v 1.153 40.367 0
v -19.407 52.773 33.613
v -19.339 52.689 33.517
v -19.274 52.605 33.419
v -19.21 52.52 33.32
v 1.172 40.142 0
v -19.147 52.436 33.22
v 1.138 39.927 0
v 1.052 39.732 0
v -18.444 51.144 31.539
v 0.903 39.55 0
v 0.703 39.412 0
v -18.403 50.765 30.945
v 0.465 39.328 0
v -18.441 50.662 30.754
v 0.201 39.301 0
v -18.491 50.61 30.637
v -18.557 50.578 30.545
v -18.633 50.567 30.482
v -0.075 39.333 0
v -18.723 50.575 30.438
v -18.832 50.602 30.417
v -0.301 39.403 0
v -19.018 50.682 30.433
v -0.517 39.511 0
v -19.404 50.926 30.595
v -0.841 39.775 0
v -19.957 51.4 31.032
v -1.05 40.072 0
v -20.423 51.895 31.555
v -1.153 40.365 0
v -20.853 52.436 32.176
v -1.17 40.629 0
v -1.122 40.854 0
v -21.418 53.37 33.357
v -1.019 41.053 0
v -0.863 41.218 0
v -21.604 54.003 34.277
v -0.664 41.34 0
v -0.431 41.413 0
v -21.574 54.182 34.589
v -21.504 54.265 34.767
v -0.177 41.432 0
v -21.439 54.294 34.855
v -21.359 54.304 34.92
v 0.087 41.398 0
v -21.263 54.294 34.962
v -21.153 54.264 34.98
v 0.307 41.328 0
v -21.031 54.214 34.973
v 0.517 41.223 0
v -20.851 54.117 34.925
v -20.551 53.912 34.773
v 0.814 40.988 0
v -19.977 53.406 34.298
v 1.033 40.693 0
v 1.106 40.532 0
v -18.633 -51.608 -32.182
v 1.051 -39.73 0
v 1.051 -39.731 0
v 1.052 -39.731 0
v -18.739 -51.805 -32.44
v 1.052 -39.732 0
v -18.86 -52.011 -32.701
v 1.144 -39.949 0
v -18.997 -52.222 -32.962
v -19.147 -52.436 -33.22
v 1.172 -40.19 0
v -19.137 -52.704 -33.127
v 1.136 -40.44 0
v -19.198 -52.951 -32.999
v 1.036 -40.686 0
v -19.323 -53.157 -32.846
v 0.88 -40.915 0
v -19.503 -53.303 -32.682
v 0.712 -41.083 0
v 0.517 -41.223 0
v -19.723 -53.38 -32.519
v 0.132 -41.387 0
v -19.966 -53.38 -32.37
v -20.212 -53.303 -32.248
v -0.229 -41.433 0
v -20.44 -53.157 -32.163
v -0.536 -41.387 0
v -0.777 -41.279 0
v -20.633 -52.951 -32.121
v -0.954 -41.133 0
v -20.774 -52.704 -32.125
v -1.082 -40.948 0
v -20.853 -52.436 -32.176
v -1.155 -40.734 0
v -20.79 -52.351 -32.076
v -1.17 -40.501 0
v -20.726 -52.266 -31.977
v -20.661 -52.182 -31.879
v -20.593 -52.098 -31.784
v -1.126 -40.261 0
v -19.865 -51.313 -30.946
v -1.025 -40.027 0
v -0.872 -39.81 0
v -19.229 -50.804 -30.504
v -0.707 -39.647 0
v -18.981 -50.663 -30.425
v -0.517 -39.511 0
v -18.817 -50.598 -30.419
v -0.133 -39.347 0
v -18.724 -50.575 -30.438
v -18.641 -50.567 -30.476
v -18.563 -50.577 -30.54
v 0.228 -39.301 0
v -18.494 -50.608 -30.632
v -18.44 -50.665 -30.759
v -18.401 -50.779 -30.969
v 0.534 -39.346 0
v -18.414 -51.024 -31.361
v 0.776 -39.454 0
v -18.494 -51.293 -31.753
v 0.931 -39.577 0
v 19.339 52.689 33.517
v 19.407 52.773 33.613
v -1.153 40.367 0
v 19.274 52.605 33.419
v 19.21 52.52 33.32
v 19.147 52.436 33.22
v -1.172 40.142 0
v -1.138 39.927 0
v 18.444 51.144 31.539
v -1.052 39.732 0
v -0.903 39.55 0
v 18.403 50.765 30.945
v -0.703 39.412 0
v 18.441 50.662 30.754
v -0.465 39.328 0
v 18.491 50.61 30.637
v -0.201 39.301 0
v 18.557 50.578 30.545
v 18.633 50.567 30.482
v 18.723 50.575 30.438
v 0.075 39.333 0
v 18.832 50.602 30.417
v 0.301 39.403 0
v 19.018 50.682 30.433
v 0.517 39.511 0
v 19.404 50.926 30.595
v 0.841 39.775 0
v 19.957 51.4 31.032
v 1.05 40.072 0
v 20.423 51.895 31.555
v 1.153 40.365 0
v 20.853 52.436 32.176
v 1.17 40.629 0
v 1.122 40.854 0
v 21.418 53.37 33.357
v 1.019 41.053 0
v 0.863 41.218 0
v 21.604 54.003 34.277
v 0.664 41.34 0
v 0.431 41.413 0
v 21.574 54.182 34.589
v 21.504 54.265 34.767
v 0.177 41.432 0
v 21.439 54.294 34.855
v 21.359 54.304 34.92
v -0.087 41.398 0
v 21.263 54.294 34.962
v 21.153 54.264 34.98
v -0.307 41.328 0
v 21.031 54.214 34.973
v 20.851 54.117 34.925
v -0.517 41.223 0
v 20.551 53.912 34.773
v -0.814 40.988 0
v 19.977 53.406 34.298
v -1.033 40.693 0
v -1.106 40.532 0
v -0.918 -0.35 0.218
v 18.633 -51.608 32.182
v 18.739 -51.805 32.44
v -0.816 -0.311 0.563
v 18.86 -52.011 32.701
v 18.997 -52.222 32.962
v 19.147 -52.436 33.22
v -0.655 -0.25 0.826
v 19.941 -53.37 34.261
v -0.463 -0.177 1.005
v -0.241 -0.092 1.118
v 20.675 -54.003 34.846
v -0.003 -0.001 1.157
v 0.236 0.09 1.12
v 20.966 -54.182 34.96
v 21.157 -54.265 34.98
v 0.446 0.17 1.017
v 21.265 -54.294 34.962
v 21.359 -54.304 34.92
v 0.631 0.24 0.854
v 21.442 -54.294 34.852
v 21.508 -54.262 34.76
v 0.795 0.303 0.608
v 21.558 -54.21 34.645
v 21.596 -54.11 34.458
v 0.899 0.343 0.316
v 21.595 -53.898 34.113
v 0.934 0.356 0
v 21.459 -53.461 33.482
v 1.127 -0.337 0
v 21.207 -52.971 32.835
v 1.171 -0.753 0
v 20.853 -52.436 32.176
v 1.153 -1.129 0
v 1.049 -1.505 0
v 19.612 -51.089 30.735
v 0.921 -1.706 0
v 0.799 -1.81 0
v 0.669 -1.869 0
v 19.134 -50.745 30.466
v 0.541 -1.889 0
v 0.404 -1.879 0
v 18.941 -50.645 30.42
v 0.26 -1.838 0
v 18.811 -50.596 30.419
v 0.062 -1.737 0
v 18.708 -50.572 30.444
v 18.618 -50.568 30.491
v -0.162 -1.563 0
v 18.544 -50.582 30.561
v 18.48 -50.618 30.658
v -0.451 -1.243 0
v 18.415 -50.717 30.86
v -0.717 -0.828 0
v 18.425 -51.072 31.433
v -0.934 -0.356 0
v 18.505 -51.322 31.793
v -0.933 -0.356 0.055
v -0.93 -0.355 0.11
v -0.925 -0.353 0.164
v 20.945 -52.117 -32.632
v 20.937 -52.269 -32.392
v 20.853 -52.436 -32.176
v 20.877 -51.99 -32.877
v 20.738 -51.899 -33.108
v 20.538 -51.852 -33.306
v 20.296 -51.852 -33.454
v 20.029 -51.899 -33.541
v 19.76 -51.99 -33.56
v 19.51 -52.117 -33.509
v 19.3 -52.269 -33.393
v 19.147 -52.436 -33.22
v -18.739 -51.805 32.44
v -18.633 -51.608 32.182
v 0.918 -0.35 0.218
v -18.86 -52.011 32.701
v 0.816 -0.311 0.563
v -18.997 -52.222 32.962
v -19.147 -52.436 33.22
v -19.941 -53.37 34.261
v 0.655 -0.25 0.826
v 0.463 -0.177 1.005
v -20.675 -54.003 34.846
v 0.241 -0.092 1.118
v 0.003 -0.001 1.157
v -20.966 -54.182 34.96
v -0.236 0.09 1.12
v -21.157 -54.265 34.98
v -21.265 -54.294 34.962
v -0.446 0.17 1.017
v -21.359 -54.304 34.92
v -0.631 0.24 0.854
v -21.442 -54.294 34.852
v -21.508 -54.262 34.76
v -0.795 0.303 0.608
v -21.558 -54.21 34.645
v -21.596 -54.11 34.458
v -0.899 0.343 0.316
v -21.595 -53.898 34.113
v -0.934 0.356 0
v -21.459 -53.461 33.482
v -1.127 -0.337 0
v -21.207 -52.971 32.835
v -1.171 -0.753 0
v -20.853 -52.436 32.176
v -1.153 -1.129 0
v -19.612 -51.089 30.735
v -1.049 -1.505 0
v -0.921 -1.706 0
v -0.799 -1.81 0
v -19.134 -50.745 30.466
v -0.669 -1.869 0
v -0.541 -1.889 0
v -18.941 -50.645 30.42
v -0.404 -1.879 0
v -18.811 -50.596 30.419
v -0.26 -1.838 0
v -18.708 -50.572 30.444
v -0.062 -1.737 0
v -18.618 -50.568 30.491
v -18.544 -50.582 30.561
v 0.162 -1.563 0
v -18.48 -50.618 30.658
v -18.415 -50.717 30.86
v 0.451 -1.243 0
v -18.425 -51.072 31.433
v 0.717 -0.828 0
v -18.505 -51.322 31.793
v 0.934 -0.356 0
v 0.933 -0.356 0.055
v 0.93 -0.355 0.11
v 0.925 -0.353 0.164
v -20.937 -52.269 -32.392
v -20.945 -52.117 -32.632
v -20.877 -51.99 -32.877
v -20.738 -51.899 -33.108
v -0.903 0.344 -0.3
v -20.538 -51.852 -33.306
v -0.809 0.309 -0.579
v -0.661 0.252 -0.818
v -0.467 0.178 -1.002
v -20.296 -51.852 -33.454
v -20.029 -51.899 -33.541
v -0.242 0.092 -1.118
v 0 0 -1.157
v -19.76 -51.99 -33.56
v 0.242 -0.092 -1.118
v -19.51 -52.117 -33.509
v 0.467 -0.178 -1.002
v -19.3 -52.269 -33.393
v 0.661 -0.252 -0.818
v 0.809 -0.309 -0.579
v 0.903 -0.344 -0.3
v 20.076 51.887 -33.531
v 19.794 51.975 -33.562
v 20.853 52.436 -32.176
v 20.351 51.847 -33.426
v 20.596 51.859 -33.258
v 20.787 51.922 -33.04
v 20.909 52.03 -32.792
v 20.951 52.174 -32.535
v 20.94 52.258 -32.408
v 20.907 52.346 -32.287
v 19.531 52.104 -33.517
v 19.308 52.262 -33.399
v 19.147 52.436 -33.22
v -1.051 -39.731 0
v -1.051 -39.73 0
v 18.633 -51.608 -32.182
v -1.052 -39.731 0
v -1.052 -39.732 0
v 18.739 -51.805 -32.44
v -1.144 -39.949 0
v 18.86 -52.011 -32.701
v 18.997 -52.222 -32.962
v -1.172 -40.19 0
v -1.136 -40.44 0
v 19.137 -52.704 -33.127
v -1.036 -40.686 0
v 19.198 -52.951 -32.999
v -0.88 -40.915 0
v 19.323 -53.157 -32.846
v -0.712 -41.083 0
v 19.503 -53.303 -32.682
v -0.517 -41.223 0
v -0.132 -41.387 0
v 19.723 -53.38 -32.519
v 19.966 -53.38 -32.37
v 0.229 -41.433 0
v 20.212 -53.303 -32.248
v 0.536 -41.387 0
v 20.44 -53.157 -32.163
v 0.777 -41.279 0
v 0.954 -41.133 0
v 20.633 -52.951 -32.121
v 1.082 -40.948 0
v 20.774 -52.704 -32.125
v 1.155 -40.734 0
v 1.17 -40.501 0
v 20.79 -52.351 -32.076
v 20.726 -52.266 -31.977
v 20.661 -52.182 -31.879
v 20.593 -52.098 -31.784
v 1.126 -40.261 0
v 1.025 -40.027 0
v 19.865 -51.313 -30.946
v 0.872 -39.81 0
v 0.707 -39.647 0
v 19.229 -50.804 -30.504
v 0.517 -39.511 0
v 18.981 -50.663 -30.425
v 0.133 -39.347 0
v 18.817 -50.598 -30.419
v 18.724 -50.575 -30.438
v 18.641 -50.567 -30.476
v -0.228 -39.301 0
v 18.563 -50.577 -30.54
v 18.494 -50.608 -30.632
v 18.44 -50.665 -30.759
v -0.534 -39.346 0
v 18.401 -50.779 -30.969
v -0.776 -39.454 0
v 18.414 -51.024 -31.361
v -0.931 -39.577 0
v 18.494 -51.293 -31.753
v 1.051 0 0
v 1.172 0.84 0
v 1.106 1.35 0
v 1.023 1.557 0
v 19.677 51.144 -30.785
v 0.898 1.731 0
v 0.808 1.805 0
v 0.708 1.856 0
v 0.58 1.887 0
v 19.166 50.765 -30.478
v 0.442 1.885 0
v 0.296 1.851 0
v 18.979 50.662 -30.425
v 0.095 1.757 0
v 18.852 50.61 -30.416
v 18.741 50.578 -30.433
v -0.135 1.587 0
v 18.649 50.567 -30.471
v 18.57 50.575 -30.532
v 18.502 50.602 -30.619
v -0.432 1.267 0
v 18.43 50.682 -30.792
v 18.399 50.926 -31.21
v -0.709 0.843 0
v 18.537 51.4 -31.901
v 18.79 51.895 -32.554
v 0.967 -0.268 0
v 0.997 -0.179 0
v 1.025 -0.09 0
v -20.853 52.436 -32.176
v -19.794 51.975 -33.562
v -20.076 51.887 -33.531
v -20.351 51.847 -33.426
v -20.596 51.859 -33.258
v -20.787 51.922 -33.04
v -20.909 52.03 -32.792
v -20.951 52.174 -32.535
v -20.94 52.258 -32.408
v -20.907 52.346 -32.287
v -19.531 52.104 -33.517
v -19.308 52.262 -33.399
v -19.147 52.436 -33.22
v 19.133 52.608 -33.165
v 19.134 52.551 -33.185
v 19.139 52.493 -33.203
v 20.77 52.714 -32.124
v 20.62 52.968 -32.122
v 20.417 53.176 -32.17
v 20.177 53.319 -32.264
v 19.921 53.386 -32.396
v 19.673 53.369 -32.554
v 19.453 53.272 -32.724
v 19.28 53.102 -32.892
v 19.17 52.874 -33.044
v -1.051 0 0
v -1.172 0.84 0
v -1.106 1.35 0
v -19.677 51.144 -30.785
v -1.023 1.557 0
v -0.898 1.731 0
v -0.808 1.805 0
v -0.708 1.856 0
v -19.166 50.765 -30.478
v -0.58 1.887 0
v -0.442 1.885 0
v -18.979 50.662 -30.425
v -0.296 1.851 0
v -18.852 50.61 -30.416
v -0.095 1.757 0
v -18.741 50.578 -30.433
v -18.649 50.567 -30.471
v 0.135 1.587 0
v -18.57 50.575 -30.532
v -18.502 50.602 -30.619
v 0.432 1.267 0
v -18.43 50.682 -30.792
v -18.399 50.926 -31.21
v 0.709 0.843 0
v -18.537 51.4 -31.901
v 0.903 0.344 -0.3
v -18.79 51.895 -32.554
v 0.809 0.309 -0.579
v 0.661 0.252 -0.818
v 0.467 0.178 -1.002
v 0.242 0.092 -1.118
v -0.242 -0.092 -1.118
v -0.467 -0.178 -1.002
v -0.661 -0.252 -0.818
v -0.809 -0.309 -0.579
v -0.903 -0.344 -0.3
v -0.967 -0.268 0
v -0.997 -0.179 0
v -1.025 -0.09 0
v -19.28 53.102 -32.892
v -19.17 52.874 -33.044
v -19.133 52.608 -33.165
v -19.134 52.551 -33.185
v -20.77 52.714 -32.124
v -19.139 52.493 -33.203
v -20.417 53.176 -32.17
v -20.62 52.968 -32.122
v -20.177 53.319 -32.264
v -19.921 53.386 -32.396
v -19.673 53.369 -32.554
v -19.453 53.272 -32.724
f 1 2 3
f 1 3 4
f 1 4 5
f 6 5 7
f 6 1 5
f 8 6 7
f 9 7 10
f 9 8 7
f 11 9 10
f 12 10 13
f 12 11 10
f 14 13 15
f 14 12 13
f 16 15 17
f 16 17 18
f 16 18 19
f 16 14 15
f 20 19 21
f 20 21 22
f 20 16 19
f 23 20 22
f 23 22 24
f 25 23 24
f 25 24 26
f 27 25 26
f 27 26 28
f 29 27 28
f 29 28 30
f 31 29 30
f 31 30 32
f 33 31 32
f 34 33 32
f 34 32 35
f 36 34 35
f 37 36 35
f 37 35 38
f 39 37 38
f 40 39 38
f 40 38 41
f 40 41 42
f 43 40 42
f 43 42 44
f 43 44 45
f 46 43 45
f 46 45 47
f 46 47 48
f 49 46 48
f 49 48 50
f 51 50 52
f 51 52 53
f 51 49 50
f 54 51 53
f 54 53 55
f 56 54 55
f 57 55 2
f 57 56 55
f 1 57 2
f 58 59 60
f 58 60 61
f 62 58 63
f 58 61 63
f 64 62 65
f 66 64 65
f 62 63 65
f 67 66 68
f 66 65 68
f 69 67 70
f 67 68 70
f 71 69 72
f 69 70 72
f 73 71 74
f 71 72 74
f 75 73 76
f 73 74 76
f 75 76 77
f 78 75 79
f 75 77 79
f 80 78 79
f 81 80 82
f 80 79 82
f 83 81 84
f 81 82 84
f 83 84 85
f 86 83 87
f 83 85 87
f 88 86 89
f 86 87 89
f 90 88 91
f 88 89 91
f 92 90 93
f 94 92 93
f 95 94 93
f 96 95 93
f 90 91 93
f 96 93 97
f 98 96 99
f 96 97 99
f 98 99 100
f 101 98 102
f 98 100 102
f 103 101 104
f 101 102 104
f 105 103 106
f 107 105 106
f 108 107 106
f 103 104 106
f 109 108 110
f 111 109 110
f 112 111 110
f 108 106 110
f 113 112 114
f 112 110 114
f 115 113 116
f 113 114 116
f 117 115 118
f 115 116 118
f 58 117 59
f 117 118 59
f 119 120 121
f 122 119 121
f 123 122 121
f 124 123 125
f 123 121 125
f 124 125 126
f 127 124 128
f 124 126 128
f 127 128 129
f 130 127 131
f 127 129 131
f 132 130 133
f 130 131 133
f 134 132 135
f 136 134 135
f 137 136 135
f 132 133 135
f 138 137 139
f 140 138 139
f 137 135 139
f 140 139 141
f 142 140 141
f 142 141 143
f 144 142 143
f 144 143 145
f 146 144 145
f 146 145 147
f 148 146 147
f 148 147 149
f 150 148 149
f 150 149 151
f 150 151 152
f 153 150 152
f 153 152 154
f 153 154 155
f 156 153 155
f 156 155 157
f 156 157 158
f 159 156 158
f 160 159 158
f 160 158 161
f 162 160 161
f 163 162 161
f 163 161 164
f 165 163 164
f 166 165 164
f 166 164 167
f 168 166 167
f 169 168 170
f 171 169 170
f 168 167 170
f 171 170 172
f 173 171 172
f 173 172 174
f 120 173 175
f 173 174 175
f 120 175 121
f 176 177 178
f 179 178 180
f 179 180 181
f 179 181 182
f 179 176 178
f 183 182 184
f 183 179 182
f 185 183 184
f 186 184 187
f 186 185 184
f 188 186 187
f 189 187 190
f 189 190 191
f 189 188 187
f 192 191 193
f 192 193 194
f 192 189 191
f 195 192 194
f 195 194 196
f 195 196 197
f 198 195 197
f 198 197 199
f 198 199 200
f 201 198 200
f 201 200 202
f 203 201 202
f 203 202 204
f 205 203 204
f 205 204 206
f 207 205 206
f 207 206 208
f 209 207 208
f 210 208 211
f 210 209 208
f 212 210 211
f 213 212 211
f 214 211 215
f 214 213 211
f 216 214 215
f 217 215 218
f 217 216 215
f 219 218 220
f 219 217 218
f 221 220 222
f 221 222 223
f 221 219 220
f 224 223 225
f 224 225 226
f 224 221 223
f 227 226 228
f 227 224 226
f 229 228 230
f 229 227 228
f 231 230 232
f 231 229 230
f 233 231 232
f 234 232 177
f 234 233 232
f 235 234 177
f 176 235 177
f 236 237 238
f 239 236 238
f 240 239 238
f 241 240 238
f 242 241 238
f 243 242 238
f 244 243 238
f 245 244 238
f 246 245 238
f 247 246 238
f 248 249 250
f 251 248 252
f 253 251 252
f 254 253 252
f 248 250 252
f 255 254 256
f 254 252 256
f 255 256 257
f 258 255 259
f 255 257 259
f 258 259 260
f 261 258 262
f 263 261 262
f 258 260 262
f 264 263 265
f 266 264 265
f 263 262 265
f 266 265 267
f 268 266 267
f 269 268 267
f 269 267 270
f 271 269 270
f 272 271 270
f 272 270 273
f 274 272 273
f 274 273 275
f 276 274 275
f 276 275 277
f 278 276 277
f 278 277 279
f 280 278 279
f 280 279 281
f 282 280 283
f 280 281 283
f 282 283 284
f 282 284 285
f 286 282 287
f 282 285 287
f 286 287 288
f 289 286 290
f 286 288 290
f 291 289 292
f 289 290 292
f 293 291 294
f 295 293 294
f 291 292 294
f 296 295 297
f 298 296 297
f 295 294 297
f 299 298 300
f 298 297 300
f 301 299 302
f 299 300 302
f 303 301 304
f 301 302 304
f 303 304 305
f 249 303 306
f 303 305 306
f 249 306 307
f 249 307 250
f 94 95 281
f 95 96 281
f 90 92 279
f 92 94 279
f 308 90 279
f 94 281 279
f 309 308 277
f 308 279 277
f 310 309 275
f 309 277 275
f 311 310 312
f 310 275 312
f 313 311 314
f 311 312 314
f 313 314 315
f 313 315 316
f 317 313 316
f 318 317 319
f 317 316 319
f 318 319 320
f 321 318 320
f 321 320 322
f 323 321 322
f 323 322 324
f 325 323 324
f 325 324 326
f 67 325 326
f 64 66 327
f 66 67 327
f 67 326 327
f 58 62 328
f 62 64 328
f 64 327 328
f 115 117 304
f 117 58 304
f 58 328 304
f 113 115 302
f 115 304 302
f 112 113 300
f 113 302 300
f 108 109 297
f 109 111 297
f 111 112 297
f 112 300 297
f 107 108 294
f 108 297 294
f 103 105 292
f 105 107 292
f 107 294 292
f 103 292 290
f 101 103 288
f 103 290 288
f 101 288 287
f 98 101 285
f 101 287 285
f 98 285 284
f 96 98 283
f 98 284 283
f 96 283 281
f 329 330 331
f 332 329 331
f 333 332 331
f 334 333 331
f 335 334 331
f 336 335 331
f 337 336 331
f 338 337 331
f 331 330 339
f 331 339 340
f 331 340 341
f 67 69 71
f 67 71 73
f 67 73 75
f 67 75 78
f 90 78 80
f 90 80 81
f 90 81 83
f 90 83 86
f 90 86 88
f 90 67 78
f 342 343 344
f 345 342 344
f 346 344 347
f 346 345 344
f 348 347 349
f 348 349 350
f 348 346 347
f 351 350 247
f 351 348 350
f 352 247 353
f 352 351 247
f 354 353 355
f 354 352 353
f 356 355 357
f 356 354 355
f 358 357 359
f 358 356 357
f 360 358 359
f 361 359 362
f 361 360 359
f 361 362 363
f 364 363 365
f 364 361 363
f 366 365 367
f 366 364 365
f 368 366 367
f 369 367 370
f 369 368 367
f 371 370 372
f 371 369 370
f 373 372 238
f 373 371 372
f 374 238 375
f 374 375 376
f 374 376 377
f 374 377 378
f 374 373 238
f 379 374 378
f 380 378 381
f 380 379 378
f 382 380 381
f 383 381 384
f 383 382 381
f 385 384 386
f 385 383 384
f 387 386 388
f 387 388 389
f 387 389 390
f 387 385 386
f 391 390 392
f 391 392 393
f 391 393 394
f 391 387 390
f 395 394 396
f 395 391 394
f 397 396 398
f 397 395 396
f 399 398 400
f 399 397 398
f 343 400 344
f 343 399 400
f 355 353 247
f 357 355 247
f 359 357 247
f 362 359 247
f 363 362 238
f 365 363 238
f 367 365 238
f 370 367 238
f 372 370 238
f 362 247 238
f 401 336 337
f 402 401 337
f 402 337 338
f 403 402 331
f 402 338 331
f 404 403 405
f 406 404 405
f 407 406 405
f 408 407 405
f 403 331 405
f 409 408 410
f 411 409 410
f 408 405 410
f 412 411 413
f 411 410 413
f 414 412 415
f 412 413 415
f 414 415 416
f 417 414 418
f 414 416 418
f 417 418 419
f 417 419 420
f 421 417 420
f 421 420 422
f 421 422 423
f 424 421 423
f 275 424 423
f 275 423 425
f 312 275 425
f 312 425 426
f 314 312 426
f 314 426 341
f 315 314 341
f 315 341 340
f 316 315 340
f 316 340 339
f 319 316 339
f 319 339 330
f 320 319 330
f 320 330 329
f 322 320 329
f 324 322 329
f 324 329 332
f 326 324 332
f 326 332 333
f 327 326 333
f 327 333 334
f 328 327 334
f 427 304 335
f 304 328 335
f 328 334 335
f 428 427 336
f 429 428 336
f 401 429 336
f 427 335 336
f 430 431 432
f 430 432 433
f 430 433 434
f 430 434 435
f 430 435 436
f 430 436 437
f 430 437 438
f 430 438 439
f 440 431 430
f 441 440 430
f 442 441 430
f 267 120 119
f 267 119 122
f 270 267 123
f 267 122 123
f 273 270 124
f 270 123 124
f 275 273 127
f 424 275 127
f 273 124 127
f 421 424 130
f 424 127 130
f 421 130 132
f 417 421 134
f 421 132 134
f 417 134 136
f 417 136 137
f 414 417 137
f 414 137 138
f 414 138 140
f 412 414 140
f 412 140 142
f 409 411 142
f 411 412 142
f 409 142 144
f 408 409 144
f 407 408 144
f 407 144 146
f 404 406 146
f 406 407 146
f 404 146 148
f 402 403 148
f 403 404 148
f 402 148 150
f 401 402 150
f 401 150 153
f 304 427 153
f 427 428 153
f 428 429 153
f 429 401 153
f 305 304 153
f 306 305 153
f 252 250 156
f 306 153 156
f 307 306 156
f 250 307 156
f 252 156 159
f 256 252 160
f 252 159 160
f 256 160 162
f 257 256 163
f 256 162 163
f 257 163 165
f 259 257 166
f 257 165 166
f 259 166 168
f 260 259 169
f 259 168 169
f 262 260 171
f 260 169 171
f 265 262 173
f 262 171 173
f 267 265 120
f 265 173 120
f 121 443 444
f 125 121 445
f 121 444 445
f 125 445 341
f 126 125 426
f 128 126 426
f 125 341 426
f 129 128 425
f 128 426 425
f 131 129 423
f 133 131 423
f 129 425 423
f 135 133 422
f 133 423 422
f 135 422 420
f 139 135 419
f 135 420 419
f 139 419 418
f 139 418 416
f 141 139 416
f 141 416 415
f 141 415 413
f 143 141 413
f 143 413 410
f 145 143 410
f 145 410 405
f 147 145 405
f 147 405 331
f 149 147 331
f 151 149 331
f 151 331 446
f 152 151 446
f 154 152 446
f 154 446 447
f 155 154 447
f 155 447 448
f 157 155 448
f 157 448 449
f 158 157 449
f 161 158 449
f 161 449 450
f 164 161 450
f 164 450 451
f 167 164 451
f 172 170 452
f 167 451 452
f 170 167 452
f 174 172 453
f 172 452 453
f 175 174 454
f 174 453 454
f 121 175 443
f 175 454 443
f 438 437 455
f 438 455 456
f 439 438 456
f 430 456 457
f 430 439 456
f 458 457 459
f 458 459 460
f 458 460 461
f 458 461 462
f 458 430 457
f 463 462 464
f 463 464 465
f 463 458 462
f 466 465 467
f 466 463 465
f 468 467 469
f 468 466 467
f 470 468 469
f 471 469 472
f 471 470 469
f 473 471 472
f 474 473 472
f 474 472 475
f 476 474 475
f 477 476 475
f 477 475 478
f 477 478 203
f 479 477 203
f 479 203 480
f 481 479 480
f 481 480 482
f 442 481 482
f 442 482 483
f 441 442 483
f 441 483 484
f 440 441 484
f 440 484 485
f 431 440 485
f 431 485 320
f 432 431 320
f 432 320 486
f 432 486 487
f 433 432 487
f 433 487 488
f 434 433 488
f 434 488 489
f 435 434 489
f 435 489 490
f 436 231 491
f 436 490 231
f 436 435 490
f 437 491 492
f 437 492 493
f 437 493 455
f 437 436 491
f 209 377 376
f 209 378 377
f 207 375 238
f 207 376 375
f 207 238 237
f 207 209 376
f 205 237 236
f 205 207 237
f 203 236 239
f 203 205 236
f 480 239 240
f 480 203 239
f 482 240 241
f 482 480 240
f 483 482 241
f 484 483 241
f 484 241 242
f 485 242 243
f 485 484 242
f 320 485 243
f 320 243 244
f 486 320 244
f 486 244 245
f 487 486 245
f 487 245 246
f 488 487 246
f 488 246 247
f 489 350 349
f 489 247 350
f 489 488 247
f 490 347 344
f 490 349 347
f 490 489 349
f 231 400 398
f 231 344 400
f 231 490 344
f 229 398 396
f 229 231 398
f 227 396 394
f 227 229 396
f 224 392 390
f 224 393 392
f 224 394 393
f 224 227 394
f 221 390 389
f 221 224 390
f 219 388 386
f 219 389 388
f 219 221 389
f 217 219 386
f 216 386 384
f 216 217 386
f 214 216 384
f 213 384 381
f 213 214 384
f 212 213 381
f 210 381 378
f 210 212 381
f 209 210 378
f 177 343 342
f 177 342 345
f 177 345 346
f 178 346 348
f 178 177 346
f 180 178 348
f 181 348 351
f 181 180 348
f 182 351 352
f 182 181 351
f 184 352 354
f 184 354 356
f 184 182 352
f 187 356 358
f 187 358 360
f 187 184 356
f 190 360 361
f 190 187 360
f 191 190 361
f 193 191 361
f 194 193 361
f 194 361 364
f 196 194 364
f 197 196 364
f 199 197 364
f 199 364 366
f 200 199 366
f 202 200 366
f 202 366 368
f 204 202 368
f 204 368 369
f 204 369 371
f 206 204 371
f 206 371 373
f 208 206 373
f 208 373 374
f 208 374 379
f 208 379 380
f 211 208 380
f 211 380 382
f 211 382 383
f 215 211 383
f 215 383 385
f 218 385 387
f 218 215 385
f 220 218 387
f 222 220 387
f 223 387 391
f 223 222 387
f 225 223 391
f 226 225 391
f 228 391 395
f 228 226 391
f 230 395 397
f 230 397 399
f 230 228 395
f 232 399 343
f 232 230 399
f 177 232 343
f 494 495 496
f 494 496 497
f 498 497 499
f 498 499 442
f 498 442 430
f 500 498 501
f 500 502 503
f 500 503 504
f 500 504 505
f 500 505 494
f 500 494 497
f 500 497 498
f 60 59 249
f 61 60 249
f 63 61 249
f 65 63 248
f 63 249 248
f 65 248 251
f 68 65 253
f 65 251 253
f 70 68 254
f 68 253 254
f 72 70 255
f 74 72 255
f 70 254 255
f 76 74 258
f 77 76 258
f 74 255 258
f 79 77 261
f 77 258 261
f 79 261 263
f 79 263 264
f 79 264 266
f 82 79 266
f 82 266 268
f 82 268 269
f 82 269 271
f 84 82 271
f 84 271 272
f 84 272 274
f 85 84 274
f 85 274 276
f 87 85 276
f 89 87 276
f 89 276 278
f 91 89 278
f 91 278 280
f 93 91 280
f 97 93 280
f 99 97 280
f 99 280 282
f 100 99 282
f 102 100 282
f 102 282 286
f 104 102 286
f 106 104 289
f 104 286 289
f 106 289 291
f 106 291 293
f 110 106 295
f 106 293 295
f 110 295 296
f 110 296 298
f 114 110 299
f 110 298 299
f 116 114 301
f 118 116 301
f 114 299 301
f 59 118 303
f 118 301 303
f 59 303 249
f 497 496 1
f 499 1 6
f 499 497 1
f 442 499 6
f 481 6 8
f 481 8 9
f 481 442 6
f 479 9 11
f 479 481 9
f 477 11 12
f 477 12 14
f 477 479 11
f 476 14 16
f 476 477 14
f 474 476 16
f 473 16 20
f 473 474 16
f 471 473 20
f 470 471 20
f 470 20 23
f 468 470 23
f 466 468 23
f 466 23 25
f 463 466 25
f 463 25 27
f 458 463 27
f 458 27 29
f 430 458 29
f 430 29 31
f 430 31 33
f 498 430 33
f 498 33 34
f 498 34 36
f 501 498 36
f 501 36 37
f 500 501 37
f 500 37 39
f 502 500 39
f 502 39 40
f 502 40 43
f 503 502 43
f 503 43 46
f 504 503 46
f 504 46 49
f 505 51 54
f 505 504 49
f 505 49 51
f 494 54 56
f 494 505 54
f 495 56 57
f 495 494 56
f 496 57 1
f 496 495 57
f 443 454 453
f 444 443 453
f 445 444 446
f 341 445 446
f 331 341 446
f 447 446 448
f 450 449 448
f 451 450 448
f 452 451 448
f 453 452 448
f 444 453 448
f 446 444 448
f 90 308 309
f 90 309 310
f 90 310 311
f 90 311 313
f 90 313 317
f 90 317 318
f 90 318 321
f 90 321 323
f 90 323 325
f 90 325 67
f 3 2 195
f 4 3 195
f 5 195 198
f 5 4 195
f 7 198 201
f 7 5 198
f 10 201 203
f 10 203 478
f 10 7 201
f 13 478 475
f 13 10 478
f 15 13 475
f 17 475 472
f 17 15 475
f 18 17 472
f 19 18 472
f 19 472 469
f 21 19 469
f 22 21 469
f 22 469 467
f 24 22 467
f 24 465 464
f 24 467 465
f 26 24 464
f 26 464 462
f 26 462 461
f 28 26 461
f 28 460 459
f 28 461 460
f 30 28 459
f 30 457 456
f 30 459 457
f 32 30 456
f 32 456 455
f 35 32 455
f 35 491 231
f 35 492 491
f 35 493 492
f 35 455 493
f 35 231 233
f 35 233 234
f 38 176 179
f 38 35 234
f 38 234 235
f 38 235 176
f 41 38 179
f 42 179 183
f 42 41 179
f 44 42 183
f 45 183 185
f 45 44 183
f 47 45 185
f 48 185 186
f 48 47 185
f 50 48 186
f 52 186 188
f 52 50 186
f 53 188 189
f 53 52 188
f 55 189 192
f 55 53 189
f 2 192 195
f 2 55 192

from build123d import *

# Parameters (mm, degrees)
F19_R = 1
F22_R = 1


with BuildPart() as f20:
    # F20: sweep along a path in F17, F11, F13
    with BuildLine(Plane(origin=(0, 0, 0), x_dir=(0.3563767573, -0.9343423392, 0), z_dir=(-0.9343423392, -0.3563767573, 0))) as f20_path:
        Line((56.1203826827, 32.6981630323), (-56.1203826827, -32.6981630323))
    with BuildLine(Plane(origin=(0, -35.5270401876, -13.1128483886), x_dir=(-1, 0, 0), z_dir=(0, 0.9381378928, 0.3462618865))) as f20_path_2:
        Line((-20, 48.8318527274), (0, 13.9775277054))
    with BuildLine(Plane(origin=(0, -35.5270401876, 13.1128483886), x_dir=(1, 0, 0), z_dir=(0, -0.9381378928, 0.3462618865))) as f20_path_3:
        Line((0, -13.9775277054), (20, -48.8318527274))
    # F19 (on line) → F20 (sweep)
    with BuildSketch(Plane(origin=(-20, 52.4356496332, -32.6981630323), x_dir=(-0.9514112279, -0.2612841756, 0.1629332836), z_dir=(-0.3079231647, 0.8073075588, -0.503426092))):
        Circle(F19_R)
    sweep(path=f20_path.line + f20_path_2.line + f20_path_3.line, transition=Transition.RIGHT)

    # F23: sweep along a path in F9, F7, F15
    with BuildLine(Plane(origin=(0, 35.5270401876, 13.1128483886), x_dir=(1, 0, 0), z_dir=(0, -0.9381378928, -0.3462618865))) as f23_path:
        Line((0, -13.9775277054), (-20, -48.8318527274))
    with BuildLine(Plane(origin=(13.9925451171, 6.9326781831, 5.9997963879), x_dir=(-0.3808799456, 0.9100870581, -0.1633156872), z_dir=(0.8364372396, 0.4144171167, 0.3586519169))) as f23_path_2:
        Line((49.9984820611, 37.9337331064), (36.7374162914, 0))
    with BuildLine(Plane(origin=(0, 0, 0), x_dir=(0.3563767573, -0.9343423392, 0), z_dir=(-0.9343423392, -0.3563767573, 0))) as f23_path_3:
        Line((56.1203826827, -32.6981630323), (-56.1203826827, 32.6981630323))
    # F22 (on line) → F23 (sweep)
    with BuildSketch(Plane(origin=(-26.033812996, 15.7097456206, -42.5628930848), x_dir=(0.8673494006, 0.172334446, -0.4669109722), z_dir=(-0.497699726, 0.3003300397, -0.8136933391))):
        with Locations((6.9566117088, -37.8697422404)):
            Circle(F22_R)
    sweep(path=f23_path.line + f23_path_2.line + f23_path_3.line, transition=Transition.RIGHT)


with BuildPart() as f24_1:
    # F24: instance of F20
    add(f20.part.mirror(Plane.YZ))


solid = Compound([f20.part, f24_1.part])
